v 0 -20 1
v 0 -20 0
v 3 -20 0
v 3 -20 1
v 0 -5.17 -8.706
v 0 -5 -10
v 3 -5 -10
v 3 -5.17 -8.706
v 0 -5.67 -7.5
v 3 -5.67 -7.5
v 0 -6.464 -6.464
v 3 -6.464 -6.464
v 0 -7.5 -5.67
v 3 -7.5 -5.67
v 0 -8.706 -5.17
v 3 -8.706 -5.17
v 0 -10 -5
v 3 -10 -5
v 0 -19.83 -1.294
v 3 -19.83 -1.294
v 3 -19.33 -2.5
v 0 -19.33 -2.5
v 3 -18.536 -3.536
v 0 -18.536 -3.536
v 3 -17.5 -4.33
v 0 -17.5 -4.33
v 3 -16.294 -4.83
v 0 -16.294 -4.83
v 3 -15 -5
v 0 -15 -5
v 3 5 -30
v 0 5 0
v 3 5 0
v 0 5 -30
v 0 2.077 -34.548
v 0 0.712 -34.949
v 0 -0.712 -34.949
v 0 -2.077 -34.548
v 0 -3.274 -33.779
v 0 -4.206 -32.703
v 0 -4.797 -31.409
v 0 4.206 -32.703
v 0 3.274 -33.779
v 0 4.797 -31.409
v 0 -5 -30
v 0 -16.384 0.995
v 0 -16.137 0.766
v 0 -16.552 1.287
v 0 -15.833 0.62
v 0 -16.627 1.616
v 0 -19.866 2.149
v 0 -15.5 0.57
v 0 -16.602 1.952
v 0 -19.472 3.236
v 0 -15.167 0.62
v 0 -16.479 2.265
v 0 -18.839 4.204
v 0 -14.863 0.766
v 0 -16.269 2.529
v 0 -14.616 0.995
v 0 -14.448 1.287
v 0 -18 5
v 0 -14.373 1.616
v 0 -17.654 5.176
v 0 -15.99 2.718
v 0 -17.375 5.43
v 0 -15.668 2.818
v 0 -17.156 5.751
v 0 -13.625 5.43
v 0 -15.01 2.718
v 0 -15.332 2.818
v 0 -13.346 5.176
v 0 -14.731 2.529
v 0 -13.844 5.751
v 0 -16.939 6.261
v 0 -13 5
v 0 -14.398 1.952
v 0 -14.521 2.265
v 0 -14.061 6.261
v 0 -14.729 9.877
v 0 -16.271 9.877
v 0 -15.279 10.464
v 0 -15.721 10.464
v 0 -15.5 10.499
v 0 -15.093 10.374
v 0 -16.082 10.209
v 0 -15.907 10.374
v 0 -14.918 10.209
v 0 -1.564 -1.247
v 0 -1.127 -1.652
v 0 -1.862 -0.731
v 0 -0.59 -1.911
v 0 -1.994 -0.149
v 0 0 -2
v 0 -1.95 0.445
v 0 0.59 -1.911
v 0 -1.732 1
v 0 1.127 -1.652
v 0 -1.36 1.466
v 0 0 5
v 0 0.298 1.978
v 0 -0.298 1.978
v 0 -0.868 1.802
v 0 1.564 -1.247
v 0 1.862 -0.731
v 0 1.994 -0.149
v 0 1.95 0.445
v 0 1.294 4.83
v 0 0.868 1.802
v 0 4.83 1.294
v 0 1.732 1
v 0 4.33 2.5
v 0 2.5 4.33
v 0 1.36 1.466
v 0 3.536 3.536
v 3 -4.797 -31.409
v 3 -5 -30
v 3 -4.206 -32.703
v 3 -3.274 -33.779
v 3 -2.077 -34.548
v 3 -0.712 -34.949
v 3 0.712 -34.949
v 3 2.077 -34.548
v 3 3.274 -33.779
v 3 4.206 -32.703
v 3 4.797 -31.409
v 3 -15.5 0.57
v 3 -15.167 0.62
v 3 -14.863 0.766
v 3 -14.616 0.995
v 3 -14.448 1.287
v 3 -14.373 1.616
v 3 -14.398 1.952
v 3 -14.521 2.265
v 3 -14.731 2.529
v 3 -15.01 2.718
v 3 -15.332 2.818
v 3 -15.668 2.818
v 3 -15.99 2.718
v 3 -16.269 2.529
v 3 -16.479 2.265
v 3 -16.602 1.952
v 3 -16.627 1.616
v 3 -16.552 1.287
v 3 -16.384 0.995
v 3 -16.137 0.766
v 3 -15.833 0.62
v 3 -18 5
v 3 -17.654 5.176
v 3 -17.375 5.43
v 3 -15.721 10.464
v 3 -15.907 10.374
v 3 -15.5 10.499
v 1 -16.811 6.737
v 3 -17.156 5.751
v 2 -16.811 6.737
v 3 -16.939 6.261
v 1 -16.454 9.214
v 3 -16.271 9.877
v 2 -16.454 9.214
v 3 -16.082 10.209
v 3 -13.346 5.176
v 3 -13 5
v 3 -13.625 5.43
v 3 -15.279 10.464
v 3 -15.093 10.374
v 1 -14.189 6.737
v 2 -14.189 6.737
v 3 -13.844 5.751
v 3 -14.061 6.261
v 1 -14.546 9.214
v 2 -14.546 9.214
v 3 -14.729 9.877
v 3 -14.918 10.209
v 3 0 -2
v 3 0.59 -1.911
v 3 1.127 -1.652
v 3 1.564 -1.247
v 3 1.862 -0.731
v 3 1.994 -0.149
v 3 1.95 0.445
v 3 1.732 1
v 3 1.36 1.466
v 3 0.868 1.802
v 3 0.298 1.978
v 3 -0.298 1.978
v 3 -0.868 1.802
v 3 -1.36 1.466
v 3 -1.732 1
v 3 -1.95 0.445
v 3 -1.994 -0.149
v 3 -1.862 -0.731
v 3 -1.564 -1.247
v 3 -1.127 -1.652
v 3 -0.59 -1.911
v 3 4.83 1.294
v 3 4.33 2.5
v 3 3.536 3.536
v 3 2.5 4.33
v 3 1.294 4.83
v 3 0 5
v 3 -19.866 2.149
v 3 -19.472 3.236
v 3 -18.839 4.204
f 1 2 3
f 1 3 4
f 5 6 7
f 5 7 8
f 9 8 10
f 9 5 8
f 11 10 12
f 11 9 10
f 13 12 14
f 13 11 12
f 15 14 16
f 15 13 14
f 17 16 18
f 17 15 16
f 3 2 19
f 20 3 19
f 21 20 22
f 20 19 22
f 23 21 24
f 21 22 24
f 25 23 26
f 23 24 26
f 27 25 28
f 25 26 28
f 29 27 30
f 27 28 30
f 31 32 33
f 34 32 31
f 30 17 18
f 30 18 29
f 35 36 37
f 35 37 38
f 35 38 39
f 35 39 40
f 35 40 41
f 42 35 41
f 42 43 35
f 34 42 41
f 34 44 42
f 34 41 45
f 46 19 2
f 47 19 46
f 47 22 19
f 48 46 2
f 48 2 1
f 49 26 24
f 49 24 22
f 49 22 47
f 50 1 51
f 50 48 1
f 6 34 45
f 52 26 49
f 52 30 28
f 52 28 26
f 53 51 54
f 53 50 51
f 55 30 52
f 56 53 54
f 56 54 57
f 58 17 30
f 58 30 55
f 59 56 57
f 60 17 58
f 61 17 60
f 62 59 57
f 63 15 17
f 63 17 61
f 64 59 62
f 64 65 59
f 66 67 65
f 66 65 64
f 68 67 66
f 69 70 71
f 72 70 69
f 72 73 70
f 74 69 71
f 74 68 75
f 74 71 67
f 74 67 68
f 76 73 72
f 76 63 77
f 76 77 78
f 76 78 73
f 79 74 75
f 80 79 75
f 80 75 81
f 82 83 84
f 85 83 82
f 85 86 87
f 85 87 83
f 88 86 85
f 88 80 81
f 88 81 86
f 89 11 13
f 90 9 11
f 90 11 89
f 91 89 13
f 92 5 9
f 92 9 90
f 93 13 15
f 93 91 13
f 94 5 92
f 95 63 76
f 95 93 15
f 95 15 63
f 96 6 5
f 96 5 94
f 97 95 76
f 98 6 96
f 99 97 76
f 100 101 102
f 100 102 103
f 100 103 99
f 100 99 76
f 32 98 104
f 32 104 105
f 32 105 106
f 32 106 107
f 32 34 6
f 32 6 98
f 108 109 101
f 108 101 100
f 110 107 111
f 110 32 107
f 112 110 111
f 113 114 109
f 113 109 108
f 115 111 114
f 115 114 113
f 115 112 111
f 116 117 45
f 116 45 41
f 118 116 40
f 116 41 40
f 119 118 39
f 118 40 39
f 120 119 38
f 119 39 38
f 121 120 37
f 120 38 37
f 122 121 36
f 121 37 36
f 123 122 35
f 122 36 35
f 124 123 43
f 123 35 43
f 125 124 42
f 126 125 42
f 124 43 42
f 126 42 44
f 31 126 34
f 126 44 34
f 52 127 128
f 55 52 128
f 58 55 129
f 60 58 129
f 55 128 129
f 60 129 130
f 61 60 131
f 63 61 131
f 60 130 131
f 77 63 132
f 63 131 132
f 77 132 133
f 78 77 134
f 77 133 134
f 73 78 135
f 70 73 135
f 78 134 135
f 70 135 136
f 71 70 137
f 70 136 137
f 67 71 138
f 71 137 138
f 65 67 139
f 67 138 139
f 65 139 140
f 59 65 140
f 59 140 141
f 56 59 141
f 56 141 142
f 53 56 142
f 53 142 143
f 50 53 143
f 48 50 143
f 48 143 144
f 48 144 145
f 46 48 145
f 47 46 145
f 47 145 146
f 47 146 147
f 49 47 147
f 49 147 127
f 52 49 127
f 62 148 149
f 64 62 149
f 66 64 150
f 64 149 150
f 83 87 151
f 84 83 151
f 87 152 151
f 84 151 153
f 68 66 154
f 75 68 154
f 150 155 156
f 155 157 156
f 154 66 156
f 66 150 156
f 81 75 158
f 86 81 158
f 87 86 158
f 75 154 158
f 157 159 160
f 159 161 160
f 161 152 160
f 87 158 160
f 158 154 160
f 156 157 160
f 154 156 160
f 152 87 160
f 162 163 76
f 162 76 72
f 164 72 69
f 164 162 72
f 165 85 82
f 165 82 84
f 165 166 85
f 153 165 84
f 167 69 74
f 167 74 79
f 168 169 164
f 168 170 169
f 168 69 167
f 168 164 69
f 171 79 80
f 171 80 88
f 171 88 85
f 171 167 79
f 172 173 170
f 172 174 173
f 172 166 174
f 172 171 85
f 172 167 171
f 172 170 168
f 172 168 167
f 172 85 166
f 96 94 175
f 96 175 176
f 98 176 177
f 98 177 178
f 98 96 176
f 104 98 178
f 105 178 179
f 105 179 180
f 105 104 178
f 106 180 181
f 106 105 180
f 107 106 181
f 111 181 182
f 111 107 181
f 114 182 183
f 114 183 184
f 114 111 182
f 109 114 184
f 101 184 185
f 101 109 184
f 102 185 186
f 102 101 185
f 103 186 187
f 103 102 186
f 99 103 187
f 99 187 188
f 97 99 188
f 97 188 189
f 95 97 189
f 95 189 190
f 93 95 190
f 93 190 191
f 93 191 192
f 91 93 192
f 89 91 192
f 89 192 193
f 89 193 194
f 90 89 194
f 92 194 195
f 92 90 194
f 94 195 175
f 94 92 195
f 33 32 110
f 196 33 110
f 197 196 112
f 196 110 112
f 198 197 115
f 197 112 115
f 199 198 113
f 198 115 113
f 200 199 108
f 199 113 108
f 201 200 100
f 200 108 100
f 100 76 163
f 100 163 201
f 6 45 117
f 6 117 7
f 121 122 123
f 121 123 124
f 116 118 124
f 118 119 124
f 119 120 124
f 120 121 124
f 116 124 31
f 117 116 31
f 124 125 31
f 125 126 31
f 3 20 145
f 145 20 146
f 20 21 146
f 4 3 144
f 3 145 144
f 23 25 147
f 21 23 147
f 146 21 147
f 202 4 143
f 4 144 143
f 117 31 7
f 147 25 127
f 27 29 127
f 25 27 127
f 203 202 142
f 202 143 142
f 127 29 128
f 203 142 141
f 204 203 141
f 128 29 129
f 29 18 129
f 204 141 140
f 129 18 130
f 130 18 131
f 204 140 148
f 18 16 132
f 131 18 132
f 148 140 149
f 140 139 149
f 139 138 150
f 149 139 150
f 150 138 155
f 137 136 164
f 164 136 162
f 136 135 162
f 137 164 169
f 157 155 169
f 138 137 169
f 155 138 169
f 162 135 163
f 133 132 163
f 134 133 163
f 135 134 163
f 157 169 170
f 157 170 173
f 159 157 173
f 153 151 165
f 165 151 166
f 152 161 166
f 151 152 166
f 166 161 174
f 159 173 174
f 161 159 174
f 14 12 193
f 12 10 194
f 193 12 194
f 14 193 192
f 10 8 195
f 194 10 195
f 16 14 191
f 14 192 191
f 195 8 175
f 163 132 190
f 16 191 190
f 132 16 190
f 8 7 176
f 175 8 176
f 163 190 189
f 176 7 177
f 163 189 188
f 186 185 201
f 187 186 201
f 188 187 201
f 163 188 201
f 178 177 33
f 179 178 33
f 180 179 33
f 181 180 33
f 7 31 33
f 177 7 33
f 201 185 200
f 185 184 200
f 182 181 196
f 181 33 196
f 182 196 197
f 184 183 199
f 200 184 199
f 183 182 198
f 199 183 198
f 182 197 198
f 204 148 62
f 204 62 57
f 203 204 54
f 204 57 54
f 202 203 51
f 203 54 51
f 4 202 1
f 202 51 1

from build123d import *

# Parameters (mm, degrees)
SKETCH1_R           = 2
BOSS_EXTRUDE1_DEPTH = 3
SKETCH2_R           = 1.1303
CUT_EXTRUDE1_DEPTH  = 41.422765863
BOSS_EXTRUDE4_DEPTH = 3
FILLET1_R           = 5


with BuildPart() as part:
    # Sketch1 → Boss-Extrude1 (new body)
    with BuildSketch(Plane(origin=(0, 0, 0), x_dir=(0, 0, -1), z_dir=(1, 0, 0))):
        Polygon((-5, 5), (35, 5), (35, -5), (5, -5), (5, -20), (-5, -20), align=None)
        Circle(SKETCH1_R, mode=Mode.SUBTRACT)
    extrude(amount=BOSS_EXTRUDE1_DEPTH)

    # Sketch2 → Cut-Extrude1 (cut, through all)
    with BuildSketch(Plane(origin=(3, 0, 0), x_dir=(0, 0, -1), z_dir=(1, 0, 0))):
        with Locations((-1.7, -15.5)):
            Circle(SKETCH2_R)
    extrude(amount=-CUT_EXTRUDE1_DEPTH, mode=Mode.SUBTRACT)

    # Sketch3 → Boss-Extrude4 (add)
    with BuildSketch(Plane(origin=(3, 0, 0), x_dir=(0, 0, -1), z_dir=(1, 0, 0))):
        with BuildLine():
            Line((-5, -18), (-5, -13))
            add(Edge.make_bspline(
                [(-5, -13), (-5.721407716, -15.082195162), (-10.455731115, -13.770011947), (-10.499261295, -15.5)],
                knots=[0, 0, 0, 0, 1, 1, 1, 1], degree=3))
            add(Edge.make_bspline(
                [(-5, -18), (-5.721407716, -15.917804838), (-10.455731115, -17.229988053), (-10.499261295, -15.5)],
                knots=[0, 0, 0, 0, 1, 1, 1, 1], degree=3))
        make_face()
    extrude(amount=-BOSS_EXTRUDE4_DEPTH)

    # Fillet1
    # the kernel refuses this fillet: 5 mm, written as the material it adds along each edge
    with BuildSketch(Plane(origin=(0, -5, -5), x_dir=(0, 0, -1), z_dir=(1, 0, 0))) as fillet1_piece_1:
        with BuildLine():
            CenterArc((FILLET1_R, -FILLET1_R), FILLET1_R, 90, 90)
            Line((0, -FILLET1_R), (0, 0))
            Line((0, 0), (FILLET1_R, 0))
        make_face()
    extrude(amount=3)
    # the kernel refuses this fillet: 5 mm, written as the material it takes off along each edge
    with BuildSketch(Plane(origin=(-12.5, -20, -5), x_dir=(0, 1, 0), z_dir=(1, 0, 0)), Plane(origin=(-12.5, -5, -35), x_dir=(0, 1, 0), z_dir=(1, 0, 0)), Plane(origin=(-12.5, 5, -35), x_dir=(0, 0, 1), z_dir=(1, 0, 0))) as fillet1_2_piece_1:
        with BuildLine():
            CenterArc((FILLET1_R, FILLET1_R), FILLET1_R, 180, 90)
            Line((0, FILLET1_R), (0, 0))
            Line((0, 0), (FILLET1_R, 0))
        make_face()
    extrude(amount=28, mode=Mode.SUBTRACT)
    with BuildSketch(Plane(origin=(-12.5, 5, 5), x_dir=(0, 0, -1), z_dir=(1, 0, 0))) as fillet1_2_piece_2:
        with BuildLine():
            CenterArc((FILLET1_R, -FILLET1_R), FILLET1_R, 90, 90)
            Line((0, -FILLET1_R), (0, 0))
            Line((0, 0), (FILLET1_R, 0))
        make_face()
    extrude(amount=28, mode=Mode.SUBTRACT)
    with BuildSketch(Plane(origin=(-10, -20, 5), x_dir=(0, 0, -1), z_dir=(1, 0, 0))) as fillet1_2_piece_3:
        with BuildLine():
            CenterArc((4, 5), FILLET1_R, 216.869897646, 53.130102354)
            Line((0, 2), (0, 0))
            Line((0, 0), (4, 0))
        make_face()
    extrude(amount=23, mode=Mode.SUBTRACT)


solid = part.part
